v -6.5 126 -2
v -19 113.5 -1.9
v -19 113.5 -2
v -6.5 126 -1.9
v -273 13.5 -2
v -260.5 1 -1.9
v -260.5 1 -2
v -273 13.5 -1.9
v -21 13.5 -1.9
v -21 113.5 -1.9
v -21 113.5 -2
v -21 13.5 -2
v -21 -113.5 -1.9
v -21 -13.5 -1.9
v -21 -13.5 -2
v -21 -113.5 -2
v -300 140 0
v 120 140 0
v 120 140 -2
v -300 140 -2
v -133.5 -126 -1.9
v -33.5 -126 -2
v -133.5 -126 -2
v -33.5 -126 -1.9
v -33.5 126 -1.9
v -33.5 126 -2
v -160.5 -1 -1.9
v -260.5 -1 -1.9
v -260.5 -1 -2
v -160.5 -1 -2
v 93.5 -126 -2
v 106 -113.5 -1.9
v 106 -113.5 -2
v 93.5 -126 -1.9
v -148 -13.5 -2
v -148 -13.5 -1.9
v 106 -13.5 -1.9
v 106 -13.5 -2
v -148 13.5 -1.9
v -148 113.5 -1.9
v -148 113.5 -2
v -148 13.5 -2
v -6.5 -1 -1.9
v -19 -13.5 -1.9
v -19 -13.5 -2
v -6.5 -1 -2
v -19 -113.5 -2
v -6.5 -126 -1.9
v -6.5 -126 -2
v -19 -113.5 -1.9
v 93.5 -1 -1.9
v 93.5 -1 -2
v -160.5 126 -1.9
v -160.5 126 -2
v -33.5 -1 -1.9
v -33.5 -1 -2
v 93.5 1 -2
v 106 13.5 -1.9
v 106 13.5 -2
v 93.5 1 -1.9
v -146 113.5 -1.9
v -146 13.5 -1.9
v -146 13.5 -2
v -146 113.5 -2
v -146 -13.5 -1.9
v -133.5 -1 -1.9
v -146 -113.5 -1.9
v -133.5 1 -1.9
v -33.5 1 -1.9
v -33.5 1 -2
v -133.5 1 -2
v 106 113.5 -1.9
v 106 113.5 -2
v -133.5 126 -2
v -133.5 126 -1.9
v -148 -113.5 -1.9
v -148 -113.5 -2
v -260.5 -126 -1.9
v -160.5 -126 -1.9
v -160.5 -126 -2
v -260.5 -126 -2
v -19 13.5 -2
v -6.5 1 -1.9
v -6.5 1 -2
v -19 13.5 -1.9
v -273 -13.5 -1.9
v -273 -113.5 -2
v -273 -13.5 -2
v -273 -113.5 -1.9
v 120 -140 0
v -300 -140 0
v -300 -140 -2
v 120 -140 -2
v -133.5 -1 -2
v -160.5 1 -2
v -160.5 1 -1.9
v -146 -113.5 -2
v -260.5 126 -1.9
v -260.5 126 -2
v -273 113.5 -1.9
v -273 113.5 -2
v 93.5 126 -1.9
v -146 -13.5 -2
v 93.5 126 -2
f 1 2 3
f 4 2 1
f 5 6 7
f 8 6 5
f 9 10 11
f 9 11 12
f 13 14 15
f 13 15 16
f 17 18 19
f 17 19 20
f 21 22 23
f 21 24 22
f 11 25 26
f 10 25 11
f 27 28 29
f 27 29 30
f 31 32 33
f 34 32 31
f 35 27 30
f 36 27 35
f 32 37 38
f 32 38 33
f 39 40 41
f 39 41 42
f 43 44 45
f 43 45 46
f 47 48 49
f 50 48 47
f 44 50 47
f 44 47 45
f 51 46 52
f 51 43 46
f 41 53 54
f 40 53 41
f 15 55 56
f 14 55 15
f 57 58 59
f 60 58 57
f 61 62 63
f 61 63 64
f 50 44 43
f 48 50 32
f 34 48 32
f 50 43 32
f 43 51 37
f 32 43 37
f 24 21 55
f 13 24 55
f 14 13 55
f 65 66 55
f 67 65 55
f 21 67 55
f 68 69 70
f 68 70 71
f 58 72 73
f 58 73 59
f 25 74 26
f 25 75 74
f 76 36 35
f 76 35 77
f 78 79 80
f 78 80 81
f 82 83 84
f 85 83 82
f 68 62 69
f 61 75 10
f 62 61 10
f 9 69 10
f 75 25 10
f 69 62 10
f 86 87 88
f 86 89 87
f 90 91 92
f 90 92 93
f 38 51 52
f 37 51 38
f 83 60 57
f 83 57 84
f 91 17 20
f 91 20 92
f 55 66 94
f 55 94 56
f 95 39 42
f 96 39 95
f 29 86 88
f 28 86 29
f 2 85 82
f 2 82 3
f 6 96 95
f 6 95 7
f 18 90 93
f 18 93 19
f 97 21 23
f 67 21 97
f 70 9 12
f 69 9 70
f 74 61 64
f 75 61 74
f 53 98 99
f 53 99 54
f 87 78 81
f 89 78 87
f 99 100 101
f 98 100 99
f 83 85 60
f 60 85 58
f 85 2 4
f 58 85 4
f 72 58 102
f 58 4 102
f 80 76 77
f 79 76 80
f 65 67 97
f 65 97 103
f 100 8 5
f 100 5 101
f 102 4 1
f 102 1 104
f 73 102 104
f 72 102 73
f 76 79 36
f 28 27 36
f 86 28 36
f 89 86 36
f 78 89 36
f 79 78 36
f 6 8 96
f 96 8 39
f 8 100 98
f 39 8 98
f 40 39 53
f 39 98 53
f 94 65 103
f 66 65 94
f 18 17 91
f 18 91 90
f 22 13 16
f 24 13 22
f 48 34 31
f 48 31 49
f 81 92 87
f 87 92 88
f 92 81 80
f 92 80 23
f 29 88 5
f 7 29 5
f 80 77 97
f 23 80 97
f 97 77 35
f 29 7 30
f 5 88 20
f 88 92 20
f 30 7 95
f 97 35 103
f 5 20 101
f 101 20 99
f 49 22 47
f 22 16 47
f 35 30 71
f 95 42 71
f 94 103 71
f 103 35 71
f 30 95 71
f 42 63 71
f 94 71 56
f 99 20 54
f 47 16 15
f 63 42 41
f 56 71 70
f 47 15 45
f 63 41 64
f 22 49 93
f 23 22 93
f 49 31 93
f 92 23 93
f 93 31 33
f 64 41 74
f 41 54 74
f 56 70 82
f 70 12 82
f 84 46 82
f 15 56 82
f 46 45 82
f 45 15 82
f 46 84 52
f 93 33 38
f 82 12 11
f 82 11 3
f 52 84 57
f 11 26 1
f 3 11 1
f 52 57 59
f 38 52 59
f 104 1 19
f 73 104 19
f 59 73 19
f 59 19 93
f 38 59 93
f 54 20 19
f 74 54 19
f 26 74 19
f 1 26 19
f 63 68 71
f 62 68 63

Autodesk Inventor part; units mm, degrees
ref_plane "YZ Plane" through (0, 0, 0) normal (1, 0, 0) x (0, 1, 0)
ref_plane "XZ Plane" through (0, 0, 0) normal (0, 1, 0) x (-1, 0, 0)
ref_plane "XY Plane" through (0, 0, 0) normal (0, 0, 1) x (1, 0, 0)
sketch "Sketch1" plane through (0, 0, 0) normal (0, 0, 1) x (1, 0, 0)
  line L0 (-300, -140) -> (120, -140)
  line L1 (120, -140) -> (120, 140)
  line L2 (120, 140) -> (-300, 140)
  line L3 (-300, 140) -> (-300, -140)
  point P0 (0, 0)
  dimension "d0" = 420
  dimension "d1" = 280
  dimension "d36" = 300
sketch "Sketch4" plane through (0, 0, 0) normal (0, 0, 1) x (1, 0, 0)
  line L0 (-273, -1) -> (-260.5, -1)
  line L1 (-148, -1) -> (-148, -13.5)
  line L2 (-148, -126) -> (-160.5, -126)
  line L3 (-273, -126) -> (-273, -113.5)
  line L4 (-273, -13.5) -> (-260.5, -1)
  line L5 (-160.5, -1) -> (-148, -13.5)
  line L6 (-148, -113.5) -> (-160.5, -126)
  line L7 (-260.5, -126) -> (-273, -113.5)
  line L8 (-260.5, -1) -> (-160.5, -1)
  line L9 (-273, -13.5) -> (-273, -1)
  line L10 (-160.5, -1) -> (-148, -1)
  line L11 (-148, -13.5) -> (-148, -113.5)
  line L12 (-160.5, -126) -> (-260.5, -126)
  line L13 (-148, -113.5) -> (-148, -126)
  line L14 (-260.5, -126) -> (-273, -126)
  line L15 (-273, -113.5) -> (-273, -13.5)
  line L16 (-300, -140) -> (120, -140) projected
  line L17 (-300, 140) -> (-300, -140) projected
  point P0 (0, 0)
  dimension "d6" = 125
  dimension "d7" = 125
  dimension "d8" = 12.5
  dimension "d9" = 12.5
  dimension "d10" = 12.5
  dimension "d11" = 12.5
  dimension "d12" = 12.5
  dimension "d13" = 12.5
  dimension "d14" = 12.5
  dimension "d15" = 12.5
  dimension "d22" = 14
  dimension "d23" = 27
sketch "Sketch5" plane through (0, 0, 0) normal (0, 0, 1) x (1, 0, 0)
  line L0 (-273, -13.5) -> (-260.5, -1) projected
  line L1 (-260.5, -1) -> (-160.5, -1) projected
  line L2 (-160.5, -1) -> (-148, -13.5) projected
  line L3 (-148, -13.5) -> (-148, -113.5) projected
  line L4 (-160.5, -126) -> (-260.5, -126) projected
  line L5 (-148, -113.5) -> (-160.5, -126) projected
  line L6 (-260.5, -126) -> (-273, -113.5) projected
  line L7 (-273, -113.5) -> (-273, -13.5) projected
  point P0 (0, 0)
boundary_patch "Boundary Patch3"
pattern_linear "Rectangular Pattern1" count 3 spacing 127 along (1, 0, 0) count 2 spacing 127 along (0, 1, 0) of "Boundary Patch3"
sketch "Sketch6" plane through (0, 0, 0) normal (0, 0, 1) x (1, 0, 0)
  line L0 (120, 140) -> (-300, 140) projected
  line L1 (-300, 140) -> (-300, -140) projected
  line L2 (-300, -140) -> (120, -140) projected
  line L3 (120, -140) -> (120, 140) projected
  line L4 (-260.5, 126) -> (-160.5, 126) projected
  line L5 (-133.5, 126) -> (-33.5, 126) projected
  line L6 (-146, 113.5) -> (-133.5, 126) projected
  line L7 (-160.5, 126) -> (-148, 113.5) projected
  line L8 (-273, 13.5) -> (-273, 113.5) projected
  line L9 (-273, 113.5) -> (-260.5, 126) projected
  line L10 (-260.5, 1) -> (-273, 13.5) projected
  line L11 (-160.5, 1) -> (-260.5, 1) projected
  line L12 (-148, 113.5) -> (-148, 13.5) projected
  line L13 (-148, 13.5) -> (-160.5, 1) projected
  line L14 (-133.5, 1) -> (-146, 13.5) projected
  line L15 (-146, 13.5) -> (-146, 113.5) projected
  line L16 (-21, 113.5) -> (-21, 13.5) projected
  line L17 (-19, 13.5) -> (-19, 113.5) projected
  line L18 (-33.5, 126) -> (-21, 113.5) projected
  line L19 (-19, 113.5) -> (-6.5, 126) projected
  line L20 (-6.5, 126) -> (93.5, 126) projected
  line L21 (93.5, 126) -> (106, 113.5) projected
  line L22 (106, 113.5) -> (106, 13.5) projected
  line L23 (-273, -113.5) -> (-273, -13.5) projected
  line L24 (-273, -13.5) -> (-260.5, -1) projected
  line L25 (-160.5, -1) -> (-148, -13.5) projected
  line L26 (-260.5, -1) -> (-160.5, -1) projected
  line L27 (-146, -13.5) -> (-133.5, -1) projected
  line L28 (-33.5, -1) -> (-21, -13.5) projected
  line L29 (-133.5, -1) -> (-33.5, -1) projected
  line L30 (-33.5, 1) -> (-133.5, 1) projected
  line L31 (-21, 13.5) -> (-33.5, 1) projected
  line L32 (106, 13.5) -> (93.5, 1) projected
  line L33 (-6.5, 1) -> (-19, 13.5) projected
  line L34 (93.5, 1) -> (-6.5, 1) projected
  line L35 (-6.5, -1) -> (93.5, -1) projected
  line L36 (-19, -13.5) -> (-6.5, -1) projected
  line L37 (93.5, -1) -> (106, -13.5) projected
  line L38 (-160.5, -126) -> (-260.5, -126) projected
  line L39 (-148, -13.5) -> (-148, -113.5) projected
  line L40 (-146, -113.5) -> (-146, -13.5) projected
  line L41 (-21, -13.5) -> (-21, -113.5) projected
  line L42 (-19, -113.5) -> (-19, -13.5) projected
  line L43 (106, -13.5) -> (106, -113.5) projected
  line L44 (106, -113.5) -> (93.5, -126) projected
  line L45 (93.5, -126) -> (-6.5, -126) projected
  line L46 (-6.5, -126) -> (-19, -113.5) projected
  line L47 (-21, -113.5) -> (-33.5, -126) projected
  line L48 (-33.5, -126) -> (-133.5, -126) projected
  line L49 (-133.5, -126) -> (-146, -113.5) projected
  line L50 (-148, -113.5) -> (-160.5, -126) projected
  line L51 (-260.5, -126) -> (-273, -113.5) projected
  point P0 (0, 0)
sketch "Sketch9" plane through (0, 0, 0) normal (0, 0, 1) x (1, 0, 0)
  line L0 (-260.5, 126) -> (-160.5, 126) projected
  line L1 (-160.5, 126) -> (-148, 113.5) projected
  line L2 (-148, 113.5) -> (-148, 13.5) projected
  line L3 (-273, 13.5) -> (-273, 113.5) projected
  line L4 (-273, 113.5) -> (-260.5, 126) projected
  line L5 (-160.5, 1) -> (-260.5, 1) projected
  line L6 (-260.5, 1) -> (-273, 13.5) projected
  line L7 (-273, -13.5) -> (-260.5, -1) projected
  line L8 (-260.5, -1) -> (-160.5, -1) projected
  line L9 (-273, -113.5) -> (-273, -13.5) projected
  line L10 (-160.5, -1) -> (-148, -13.5) projected
  line L11 (-148, -13.5) -> (-148, -113.5) projected
  line L12 (-148, 13.5) -> (-160.5, 1) projected
  line L13 (-133.5, 1) -> (-146, 13.5) projected
  line L14 (-146, -13.5) -> (-133.5, -1) projected
  line L15 (-146, -113.5) -> (-146, -13.5) projected
  line L16 (-146, 13.5) -> (-146, 113.5) projected
  line L17 (-133.5, 126) -> (-33.5, 126) projected
  line L18 (-146, 113.5) -> (-133.5, 126) projected
  line L19 (-33.5, 126) -> (-21, 113.5) projected
  line L20 (-21, 113.5) -> (-21, 13.5) projected
  line L21 (-21, 13.5) -> (-33.5, 1) projected
  line L22 (-33.5, 1) -> (-133.5, 1) projected
  line L23 (-133.5, -1) -> (-33.5, -1) projected
  line L24 (-33.5, -126) -> (-133.5, -126) projected
  line L25 (-160.5, -126) -> (-260.5, -126) projected
  line L26 (-260.5, -126) -> (-273, -113.5) projected
  line L27 (-148, -113.5) -> (-160.5, -126) projected
  line L28 (-21, -113.5) -> (-33.5, -126) projected
  line L29 (-133.5, -126) -> (-146, -113.5) projected
  line L30 (-33.5, -1) -> (-21, -13.5) projected
  line L31 (-6.5, 1) -> (-19, 13.5) projected
  line L32 (106, 13.5) -> (93.5, 1) projected
  line L33 (93.5, -1) -> (106, -13.5) projected
  line L34 (106, 113.5) -> (106, 13.5) projected
  line L35 (93.5, 1) -> (-6.5, 1) projected
  line L36 (-6.5, -1) -> (93.5, -1) projected
  line L37 (93.5, -126) -> (-6.5, -126) projected
  line L38 (-19, -113.5) -> (-19, -13.5) projected
  line L39 (-21, -13.5) -> (-21, -113.5) projected
  line L40 (106, -13.5) -> (106, -113.5) projected
  line L41 (-19, -13.5) -> (-6.5, -1) projected
  line L42 (-19, 13.5) -> (-19, 113.5) projected
  line L43 (-6.5, 126) -> (93.5, 126) projected
  line L44 (-19, 113.5) -> (-6.5, 126) projected
  line L45 (93.5, 126) -> (106, 113.5) projected
  line L46 (106, -113.5) -> (93.5, -126) projected
  line L47 (-6.5, -126) -> (-19, -113.5) projected
extrude "Extrusion4" add sketch "Sketch6" against normal blind 2
extrude "Extrusion6" add sketch "Sketch9" against normal blind 1.9
equation "\"d9\" = d8"
equation "\"d10\" = d9"
equation "\"d11\" = d10"
equation "\"d12\" = d11"
equation "\"d13\" = d12"
equation "\"d14\" = d13"
equation "\"d15\" = d8"
properties part number "solar1" material "Aluminum 6061-AHC"
